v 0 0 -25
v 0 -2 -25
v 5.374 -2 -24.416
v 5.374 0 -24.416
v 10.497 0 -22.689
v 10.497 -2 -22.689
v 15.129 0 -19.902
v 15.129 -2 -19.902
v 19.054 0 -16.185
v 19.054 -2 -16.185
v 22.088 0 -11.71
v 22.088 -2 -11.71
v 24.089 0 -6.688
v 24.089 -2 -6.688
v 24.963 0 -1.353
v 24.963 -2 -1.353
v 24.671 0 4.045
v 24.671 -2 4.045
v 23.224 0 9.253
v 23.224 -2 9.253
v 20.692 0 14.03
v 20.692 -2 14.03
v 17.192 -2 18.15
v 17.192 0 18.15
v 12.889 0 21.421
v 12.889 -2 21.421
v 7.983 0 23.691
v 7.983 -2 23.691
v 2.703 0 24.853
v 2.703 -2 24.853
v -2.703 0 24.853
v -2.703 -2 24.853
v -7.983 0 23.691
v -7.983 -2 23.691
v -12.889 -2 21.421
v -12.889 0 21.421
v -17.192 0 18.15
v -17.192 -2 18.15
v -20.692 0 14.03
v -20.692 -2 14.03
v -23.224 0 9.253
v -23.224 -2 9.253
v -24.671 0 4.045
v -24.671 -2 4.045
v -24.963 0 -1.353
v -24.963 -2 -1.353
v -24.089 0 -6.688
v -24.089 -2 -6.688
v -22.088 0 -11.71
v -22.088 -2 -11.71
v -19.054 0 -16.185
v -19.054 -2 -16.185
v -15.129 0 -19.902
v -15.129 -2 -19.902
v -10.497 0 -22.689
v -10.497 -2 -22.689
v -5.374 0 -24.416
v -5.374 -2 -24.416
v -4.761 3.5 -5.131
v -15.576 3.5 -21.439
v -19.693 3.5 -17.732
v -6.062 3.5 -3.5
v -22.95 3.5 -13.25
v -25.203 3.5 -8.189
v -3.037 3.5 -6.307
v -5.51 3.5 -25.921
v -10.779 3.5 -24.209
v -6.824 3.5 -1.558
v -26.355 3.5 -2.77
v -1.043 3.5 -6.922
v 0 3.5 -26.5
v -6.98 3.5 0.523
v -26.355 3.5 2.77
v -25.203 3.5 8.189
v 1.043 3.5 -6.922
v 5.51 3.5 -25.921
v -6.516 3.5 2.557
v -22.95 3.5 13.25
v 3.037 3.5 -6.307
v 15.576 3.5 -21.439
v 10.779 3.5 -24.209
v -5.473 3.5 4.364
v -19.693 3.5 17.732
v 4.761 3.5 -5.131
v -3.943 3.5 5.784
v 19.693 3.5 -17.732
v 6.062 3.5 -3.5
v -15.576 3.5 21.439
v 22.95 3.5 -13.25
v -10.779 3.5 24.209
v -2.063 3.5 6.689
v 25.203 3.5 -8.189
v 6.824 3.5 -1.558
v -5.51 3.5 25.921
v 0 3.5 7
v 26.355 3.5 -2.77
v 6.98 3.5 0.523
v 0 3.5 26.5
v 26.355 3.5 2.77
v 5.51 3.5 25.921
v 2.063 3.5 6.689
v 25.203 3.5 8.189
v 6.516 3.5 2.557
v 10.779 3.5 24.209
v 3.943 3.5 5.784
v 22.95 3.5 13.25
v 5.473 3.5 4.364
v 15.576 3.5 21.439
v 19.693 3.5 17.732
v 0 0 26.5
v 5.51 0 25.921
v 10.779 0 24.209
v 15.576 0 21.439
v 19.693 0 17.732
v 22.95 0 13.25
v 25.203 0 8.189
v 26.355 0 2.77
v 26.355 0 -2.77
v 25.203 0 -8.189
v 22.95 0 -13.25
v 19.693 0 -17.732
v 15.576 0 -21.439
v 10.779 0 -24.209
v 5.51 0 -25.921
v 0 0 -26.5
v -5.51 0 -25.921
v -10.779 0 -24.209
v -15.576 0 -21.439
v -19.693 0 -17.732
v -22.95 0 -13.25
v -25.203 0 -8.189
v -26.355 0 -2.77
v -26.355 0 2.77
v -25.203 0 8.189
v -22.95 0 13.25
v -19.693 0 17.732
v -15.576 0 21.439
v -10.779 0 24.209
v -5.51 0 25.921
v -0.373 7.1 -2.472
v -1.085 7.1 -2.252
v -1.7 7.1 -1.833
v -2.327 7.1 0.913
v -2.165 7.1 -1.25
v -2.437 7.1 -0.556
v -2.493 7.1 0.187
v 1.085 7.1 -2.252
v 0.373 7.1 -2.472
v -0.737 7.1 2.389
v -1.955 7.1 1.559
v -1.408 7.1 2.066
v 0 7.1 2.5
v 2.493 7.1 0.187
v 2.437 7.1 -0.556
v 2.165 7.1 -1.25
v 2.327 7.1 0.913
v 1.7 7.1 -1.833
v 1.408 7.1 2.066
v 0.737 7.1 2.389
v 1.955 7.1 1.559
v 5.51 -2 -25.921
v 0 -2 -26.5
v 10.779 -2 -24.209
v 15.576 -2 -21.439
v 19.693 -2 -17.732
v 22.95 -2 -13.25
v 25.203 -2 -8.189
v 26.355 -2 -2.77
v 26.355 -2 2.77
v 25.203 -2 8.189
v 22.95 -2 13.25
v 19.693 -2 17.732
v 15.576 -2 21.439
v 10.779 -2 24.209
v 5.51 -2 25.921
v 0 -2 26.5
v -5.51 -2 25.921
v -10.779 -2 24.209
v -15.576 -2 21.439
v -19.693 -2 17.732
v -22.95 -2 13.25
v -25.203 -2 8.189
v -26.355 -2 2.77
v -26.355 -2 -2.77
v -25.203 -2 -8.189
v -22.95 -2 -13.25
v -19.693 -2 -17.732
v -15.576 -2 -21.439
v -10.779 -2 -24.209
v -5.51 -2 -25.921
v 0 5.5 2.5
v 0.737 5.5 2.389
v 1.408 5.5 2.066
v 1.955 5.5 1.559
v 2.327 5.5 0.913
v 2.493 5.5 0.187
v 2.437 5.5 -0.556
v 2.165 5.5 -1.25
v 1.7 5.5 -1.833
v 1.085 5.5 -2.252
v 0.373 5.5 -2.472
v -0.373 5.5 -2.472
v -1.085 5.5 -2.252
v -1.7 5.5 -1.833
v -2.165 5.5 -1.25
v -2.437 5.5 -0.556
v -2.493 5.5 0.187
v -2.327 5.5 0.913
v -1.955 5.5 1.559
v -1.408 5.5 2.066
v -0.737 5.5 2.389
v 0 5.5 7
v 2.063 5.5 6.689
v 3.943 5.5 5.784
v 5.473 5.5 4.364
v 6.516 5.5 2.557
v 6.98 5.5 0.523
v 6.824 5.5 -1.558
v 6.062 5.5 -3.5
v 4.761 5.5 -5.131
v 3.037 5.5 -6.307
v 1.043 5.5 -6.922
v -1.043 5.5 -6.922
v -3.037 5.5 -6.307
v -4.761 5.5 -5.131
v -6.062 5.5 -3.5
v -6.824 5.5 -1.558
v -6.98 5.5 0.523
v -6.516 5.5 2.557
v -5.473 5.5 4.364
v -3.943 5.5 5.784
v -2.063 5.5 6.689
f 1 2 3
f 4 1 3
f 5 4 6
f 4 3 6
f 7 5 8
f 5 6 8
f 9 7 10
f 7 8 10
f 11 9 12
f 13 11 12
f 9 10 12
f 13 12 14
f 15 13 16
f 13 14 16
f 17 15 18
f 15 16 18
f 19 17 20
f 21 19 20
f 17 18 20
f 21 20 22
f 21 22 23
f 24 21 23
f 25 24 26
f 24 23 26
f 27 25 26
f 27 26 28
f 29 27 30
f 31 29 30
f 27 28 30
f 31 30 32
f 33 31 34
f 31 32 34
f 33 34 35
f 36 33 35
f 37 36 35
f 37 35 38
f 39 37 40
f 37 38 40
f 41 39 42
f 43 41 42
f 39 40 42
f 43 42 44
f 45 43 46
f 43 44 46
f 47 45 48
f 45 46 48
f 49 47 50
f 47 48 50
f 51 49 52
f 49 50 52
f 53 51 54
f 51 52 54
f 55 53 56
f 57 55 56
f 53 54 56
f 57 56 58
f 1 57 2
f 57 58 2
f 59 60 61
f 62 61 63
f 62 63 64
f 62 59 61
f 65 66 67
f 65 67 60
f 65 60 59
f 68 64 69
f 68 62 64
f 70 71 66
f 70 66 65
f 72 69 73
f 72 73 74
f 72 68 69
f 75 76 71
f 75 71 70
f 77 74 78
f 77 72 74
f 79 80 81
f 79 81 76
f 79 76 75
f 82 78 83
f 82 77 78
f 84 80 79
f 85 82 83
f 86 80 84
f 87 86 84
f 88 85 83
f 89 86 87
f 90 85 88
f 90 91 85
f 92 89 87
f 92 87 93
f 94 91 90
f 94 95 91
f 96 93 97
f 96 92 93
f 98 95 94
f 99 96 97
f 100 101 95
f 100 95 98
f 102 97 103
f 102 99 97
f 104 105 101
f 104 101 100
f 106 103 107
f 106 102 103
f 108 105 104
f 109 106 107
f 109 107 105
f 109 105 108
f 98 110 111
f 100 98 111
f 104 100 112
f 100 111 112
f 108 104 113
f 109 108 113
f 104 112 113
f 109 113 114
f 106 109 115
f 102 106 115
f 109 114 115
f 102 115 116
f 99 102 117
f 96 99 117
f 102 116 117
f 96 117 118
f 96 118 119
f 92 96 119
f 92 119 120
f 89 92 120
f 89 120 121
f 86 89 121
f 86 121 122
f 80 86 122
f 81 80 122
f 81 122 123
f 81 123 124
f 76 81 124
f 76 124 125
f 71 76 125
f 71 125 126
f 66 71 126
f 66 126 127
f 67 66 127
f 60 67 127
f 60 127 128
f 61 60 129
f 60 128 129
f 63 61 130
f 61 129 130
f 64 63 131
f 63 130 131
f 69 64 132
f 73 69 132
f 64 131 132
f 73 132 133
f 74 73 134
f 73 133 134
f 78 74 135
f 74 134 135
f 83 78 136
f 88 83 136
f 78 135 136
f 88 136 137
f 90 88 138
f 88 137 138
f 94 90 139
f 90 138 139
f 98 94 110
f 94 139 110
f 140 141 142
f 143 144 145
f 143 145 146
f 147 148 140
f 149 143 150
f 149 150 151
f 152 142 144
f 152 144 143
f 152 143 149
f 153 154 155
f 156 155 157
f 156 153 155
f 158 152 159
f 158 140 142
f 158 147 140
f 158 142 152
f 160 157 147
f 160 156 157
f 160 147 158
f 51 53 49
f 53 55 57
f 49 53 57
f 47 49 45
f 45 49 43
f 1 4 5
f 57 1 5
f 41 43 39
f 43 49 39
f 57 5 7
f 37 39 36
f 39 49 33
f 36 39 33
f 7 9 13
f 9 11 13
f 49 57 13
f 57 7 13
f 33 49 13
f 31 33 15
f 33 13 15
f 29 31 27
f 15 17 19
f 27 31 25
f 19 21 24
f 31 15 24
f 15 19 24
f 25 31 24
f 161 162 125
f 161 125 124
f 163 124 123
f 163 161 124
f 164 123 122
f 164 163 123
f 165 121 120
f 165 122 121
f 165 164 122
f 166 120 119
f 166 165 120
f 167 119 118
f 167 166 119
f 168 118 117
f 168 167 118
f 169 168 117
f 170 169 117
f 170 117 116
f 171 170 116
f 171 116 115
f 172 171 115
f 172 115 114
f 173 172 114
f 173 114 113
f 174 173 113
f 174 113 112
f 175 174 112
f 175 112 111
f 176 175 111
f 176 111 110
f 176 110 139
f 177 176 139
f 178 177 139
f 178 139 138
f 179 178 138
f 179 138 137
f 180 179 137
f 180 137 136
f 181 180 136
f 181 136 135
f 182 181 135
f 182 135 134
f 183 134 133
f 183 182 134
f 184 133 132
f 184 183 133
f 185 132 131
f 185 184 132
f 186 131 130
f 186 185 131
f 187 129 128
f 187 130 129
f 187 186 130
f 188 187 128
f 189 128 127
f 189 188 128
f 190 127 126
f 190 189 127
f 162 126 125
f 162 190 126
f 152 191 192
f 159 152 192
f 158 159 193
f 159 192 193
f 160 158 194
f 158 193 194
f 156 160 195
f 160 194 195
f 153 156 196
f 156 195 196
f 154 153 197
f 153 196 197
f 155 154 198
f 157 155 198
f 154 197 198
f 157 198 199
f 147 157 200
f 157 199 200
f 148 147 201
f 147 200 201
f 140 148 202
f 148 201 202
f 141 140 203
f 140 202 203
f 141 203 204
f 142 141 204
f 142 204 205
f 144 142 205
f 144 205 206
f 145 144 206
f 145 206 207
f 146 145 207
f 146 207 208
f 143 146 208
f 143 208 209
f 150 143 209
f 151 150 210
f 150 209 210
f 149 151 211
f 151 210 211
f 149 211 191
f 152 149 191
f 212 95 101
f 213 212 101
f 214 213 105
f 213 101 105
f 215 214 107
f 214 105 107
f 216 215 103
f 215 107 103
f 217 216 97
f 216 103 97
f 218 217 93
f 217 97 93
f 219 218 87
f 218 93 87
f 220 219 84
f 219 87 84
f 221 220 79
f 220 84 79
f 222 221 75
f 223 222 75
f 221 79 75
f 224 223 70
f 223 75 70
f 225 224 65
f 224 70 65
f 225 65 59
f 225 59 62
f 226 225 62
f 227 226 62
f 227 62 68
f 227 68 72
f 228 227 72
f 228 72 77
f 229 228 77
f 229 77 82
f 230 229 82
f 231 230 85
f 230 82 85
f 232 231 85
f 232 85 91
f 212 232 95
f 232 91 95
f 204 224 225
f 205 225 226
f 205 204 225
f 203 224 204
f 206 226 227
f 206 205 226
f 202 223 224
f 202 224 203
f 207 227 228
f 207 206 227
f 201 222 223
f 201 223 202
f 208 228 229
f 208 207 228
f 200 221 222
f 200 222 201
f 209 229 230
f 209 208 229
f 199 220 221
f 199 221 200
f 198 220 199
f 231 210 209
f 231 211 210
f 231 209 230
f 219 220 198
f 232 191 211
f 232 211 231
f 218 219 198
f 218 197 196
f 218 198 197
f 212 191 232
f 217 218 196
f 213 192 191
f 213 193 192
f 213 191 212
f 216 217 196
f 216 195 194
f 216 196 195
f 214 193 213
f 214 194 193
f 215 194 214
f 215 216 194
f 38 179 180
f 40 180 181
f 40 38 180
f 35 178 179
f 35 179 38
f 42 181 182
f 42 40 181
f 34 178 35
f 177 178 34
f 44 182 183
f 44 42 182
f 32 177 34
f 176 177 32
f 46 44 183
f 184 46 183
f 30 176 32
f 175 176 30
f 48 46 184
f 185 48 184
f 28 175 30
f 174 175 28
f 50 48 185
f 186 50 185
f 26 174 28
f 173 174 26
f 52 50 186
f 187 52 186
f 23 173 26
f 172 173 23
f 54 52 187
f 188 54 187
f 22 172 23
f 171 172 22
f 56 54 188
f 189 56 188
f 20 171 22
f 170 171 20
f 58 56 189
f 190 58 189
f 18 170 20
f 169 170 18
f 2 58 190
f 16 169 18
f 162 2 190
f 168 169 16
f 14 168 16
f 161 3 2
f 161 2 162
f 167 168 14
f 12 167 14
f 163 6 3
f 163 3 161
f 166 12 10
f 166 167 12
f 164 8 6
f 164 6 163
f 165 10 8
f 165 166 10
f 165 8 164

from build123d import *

# Parameters (mm, degrees)
SKETCH1_R           = 26.5
BOSS_EXTRUDE1_DEPTH = 3.5
SKETCH2_R           = 7
BOSS_EXTRUDE2_DEPTH = 2
SKETCH5_R           = 2.5
BOSS_EXTRUDE3_DEPTH = 1.6
BOSS_EXTRUDE4_START = 2
SKETCH6_R           = 26.5
SKETCH6_R_2         = 25
BOSS_EXTRUDE4_DEPTH = 2


with BuildPart() as part:
    # Sketch1 → Boss-Extrude1 (new body)
    with BuildSketch(Plane(origin=(0, 0, 0), x_dir=(1, 0, 0), z_dir=(0, 1, 0))):
        with Locations(Location((0, 0, 0), (0, 0, 270))):
            Circle(SKETCH1_R)
    extrude(amount=BOSS_EXTRUDE1_DEPTH)

    # Sketch2 → Boss-Extrude2 (add)
    with BuildSketch(Plane(origin=(0, 3.5, 0), x_dir=(1, 0, 0), z_dir=(0, 1, 0))):
        with Locations(Location((0, 0, 0), (0, 0, 270))):
            Circle(SKETCH2_R)
    extrude(amount=BOSS_EXTRUDE2_DEPTH)

    # Sketch5 → Boss-Extrude3 (add)
    with BuildSketch(Plane(origin=(0, 5.5, 0), x_dir=(1, 0, 0), z_dir=(0, 1, 0))):
        with Locations(Location((0, 0, 0), (0, 0, 270))):
            Circle(SKETCH5_R)
    extrude(amount=BOSS_EXTRUDE3_DEPTH)

    # Sketch6 → Boss-Extrude4 (add)
    with BuildSketch(Plane.XZ.offset(BOSS_EXTRUDE4_START)):
        with Locations(Location((0, 0, 0), (0, 0, 270))):
            Circle(SKETCH6_R)
        with Locations(Location((0, 0, 0), (0, 0, 270))):
            Circle(SKETCH6_R_2, mode=Mode.SUBTRACT)
    extrude(amount=-BOSS_EXTRUDE4_DEPTH)


solid = part.part
